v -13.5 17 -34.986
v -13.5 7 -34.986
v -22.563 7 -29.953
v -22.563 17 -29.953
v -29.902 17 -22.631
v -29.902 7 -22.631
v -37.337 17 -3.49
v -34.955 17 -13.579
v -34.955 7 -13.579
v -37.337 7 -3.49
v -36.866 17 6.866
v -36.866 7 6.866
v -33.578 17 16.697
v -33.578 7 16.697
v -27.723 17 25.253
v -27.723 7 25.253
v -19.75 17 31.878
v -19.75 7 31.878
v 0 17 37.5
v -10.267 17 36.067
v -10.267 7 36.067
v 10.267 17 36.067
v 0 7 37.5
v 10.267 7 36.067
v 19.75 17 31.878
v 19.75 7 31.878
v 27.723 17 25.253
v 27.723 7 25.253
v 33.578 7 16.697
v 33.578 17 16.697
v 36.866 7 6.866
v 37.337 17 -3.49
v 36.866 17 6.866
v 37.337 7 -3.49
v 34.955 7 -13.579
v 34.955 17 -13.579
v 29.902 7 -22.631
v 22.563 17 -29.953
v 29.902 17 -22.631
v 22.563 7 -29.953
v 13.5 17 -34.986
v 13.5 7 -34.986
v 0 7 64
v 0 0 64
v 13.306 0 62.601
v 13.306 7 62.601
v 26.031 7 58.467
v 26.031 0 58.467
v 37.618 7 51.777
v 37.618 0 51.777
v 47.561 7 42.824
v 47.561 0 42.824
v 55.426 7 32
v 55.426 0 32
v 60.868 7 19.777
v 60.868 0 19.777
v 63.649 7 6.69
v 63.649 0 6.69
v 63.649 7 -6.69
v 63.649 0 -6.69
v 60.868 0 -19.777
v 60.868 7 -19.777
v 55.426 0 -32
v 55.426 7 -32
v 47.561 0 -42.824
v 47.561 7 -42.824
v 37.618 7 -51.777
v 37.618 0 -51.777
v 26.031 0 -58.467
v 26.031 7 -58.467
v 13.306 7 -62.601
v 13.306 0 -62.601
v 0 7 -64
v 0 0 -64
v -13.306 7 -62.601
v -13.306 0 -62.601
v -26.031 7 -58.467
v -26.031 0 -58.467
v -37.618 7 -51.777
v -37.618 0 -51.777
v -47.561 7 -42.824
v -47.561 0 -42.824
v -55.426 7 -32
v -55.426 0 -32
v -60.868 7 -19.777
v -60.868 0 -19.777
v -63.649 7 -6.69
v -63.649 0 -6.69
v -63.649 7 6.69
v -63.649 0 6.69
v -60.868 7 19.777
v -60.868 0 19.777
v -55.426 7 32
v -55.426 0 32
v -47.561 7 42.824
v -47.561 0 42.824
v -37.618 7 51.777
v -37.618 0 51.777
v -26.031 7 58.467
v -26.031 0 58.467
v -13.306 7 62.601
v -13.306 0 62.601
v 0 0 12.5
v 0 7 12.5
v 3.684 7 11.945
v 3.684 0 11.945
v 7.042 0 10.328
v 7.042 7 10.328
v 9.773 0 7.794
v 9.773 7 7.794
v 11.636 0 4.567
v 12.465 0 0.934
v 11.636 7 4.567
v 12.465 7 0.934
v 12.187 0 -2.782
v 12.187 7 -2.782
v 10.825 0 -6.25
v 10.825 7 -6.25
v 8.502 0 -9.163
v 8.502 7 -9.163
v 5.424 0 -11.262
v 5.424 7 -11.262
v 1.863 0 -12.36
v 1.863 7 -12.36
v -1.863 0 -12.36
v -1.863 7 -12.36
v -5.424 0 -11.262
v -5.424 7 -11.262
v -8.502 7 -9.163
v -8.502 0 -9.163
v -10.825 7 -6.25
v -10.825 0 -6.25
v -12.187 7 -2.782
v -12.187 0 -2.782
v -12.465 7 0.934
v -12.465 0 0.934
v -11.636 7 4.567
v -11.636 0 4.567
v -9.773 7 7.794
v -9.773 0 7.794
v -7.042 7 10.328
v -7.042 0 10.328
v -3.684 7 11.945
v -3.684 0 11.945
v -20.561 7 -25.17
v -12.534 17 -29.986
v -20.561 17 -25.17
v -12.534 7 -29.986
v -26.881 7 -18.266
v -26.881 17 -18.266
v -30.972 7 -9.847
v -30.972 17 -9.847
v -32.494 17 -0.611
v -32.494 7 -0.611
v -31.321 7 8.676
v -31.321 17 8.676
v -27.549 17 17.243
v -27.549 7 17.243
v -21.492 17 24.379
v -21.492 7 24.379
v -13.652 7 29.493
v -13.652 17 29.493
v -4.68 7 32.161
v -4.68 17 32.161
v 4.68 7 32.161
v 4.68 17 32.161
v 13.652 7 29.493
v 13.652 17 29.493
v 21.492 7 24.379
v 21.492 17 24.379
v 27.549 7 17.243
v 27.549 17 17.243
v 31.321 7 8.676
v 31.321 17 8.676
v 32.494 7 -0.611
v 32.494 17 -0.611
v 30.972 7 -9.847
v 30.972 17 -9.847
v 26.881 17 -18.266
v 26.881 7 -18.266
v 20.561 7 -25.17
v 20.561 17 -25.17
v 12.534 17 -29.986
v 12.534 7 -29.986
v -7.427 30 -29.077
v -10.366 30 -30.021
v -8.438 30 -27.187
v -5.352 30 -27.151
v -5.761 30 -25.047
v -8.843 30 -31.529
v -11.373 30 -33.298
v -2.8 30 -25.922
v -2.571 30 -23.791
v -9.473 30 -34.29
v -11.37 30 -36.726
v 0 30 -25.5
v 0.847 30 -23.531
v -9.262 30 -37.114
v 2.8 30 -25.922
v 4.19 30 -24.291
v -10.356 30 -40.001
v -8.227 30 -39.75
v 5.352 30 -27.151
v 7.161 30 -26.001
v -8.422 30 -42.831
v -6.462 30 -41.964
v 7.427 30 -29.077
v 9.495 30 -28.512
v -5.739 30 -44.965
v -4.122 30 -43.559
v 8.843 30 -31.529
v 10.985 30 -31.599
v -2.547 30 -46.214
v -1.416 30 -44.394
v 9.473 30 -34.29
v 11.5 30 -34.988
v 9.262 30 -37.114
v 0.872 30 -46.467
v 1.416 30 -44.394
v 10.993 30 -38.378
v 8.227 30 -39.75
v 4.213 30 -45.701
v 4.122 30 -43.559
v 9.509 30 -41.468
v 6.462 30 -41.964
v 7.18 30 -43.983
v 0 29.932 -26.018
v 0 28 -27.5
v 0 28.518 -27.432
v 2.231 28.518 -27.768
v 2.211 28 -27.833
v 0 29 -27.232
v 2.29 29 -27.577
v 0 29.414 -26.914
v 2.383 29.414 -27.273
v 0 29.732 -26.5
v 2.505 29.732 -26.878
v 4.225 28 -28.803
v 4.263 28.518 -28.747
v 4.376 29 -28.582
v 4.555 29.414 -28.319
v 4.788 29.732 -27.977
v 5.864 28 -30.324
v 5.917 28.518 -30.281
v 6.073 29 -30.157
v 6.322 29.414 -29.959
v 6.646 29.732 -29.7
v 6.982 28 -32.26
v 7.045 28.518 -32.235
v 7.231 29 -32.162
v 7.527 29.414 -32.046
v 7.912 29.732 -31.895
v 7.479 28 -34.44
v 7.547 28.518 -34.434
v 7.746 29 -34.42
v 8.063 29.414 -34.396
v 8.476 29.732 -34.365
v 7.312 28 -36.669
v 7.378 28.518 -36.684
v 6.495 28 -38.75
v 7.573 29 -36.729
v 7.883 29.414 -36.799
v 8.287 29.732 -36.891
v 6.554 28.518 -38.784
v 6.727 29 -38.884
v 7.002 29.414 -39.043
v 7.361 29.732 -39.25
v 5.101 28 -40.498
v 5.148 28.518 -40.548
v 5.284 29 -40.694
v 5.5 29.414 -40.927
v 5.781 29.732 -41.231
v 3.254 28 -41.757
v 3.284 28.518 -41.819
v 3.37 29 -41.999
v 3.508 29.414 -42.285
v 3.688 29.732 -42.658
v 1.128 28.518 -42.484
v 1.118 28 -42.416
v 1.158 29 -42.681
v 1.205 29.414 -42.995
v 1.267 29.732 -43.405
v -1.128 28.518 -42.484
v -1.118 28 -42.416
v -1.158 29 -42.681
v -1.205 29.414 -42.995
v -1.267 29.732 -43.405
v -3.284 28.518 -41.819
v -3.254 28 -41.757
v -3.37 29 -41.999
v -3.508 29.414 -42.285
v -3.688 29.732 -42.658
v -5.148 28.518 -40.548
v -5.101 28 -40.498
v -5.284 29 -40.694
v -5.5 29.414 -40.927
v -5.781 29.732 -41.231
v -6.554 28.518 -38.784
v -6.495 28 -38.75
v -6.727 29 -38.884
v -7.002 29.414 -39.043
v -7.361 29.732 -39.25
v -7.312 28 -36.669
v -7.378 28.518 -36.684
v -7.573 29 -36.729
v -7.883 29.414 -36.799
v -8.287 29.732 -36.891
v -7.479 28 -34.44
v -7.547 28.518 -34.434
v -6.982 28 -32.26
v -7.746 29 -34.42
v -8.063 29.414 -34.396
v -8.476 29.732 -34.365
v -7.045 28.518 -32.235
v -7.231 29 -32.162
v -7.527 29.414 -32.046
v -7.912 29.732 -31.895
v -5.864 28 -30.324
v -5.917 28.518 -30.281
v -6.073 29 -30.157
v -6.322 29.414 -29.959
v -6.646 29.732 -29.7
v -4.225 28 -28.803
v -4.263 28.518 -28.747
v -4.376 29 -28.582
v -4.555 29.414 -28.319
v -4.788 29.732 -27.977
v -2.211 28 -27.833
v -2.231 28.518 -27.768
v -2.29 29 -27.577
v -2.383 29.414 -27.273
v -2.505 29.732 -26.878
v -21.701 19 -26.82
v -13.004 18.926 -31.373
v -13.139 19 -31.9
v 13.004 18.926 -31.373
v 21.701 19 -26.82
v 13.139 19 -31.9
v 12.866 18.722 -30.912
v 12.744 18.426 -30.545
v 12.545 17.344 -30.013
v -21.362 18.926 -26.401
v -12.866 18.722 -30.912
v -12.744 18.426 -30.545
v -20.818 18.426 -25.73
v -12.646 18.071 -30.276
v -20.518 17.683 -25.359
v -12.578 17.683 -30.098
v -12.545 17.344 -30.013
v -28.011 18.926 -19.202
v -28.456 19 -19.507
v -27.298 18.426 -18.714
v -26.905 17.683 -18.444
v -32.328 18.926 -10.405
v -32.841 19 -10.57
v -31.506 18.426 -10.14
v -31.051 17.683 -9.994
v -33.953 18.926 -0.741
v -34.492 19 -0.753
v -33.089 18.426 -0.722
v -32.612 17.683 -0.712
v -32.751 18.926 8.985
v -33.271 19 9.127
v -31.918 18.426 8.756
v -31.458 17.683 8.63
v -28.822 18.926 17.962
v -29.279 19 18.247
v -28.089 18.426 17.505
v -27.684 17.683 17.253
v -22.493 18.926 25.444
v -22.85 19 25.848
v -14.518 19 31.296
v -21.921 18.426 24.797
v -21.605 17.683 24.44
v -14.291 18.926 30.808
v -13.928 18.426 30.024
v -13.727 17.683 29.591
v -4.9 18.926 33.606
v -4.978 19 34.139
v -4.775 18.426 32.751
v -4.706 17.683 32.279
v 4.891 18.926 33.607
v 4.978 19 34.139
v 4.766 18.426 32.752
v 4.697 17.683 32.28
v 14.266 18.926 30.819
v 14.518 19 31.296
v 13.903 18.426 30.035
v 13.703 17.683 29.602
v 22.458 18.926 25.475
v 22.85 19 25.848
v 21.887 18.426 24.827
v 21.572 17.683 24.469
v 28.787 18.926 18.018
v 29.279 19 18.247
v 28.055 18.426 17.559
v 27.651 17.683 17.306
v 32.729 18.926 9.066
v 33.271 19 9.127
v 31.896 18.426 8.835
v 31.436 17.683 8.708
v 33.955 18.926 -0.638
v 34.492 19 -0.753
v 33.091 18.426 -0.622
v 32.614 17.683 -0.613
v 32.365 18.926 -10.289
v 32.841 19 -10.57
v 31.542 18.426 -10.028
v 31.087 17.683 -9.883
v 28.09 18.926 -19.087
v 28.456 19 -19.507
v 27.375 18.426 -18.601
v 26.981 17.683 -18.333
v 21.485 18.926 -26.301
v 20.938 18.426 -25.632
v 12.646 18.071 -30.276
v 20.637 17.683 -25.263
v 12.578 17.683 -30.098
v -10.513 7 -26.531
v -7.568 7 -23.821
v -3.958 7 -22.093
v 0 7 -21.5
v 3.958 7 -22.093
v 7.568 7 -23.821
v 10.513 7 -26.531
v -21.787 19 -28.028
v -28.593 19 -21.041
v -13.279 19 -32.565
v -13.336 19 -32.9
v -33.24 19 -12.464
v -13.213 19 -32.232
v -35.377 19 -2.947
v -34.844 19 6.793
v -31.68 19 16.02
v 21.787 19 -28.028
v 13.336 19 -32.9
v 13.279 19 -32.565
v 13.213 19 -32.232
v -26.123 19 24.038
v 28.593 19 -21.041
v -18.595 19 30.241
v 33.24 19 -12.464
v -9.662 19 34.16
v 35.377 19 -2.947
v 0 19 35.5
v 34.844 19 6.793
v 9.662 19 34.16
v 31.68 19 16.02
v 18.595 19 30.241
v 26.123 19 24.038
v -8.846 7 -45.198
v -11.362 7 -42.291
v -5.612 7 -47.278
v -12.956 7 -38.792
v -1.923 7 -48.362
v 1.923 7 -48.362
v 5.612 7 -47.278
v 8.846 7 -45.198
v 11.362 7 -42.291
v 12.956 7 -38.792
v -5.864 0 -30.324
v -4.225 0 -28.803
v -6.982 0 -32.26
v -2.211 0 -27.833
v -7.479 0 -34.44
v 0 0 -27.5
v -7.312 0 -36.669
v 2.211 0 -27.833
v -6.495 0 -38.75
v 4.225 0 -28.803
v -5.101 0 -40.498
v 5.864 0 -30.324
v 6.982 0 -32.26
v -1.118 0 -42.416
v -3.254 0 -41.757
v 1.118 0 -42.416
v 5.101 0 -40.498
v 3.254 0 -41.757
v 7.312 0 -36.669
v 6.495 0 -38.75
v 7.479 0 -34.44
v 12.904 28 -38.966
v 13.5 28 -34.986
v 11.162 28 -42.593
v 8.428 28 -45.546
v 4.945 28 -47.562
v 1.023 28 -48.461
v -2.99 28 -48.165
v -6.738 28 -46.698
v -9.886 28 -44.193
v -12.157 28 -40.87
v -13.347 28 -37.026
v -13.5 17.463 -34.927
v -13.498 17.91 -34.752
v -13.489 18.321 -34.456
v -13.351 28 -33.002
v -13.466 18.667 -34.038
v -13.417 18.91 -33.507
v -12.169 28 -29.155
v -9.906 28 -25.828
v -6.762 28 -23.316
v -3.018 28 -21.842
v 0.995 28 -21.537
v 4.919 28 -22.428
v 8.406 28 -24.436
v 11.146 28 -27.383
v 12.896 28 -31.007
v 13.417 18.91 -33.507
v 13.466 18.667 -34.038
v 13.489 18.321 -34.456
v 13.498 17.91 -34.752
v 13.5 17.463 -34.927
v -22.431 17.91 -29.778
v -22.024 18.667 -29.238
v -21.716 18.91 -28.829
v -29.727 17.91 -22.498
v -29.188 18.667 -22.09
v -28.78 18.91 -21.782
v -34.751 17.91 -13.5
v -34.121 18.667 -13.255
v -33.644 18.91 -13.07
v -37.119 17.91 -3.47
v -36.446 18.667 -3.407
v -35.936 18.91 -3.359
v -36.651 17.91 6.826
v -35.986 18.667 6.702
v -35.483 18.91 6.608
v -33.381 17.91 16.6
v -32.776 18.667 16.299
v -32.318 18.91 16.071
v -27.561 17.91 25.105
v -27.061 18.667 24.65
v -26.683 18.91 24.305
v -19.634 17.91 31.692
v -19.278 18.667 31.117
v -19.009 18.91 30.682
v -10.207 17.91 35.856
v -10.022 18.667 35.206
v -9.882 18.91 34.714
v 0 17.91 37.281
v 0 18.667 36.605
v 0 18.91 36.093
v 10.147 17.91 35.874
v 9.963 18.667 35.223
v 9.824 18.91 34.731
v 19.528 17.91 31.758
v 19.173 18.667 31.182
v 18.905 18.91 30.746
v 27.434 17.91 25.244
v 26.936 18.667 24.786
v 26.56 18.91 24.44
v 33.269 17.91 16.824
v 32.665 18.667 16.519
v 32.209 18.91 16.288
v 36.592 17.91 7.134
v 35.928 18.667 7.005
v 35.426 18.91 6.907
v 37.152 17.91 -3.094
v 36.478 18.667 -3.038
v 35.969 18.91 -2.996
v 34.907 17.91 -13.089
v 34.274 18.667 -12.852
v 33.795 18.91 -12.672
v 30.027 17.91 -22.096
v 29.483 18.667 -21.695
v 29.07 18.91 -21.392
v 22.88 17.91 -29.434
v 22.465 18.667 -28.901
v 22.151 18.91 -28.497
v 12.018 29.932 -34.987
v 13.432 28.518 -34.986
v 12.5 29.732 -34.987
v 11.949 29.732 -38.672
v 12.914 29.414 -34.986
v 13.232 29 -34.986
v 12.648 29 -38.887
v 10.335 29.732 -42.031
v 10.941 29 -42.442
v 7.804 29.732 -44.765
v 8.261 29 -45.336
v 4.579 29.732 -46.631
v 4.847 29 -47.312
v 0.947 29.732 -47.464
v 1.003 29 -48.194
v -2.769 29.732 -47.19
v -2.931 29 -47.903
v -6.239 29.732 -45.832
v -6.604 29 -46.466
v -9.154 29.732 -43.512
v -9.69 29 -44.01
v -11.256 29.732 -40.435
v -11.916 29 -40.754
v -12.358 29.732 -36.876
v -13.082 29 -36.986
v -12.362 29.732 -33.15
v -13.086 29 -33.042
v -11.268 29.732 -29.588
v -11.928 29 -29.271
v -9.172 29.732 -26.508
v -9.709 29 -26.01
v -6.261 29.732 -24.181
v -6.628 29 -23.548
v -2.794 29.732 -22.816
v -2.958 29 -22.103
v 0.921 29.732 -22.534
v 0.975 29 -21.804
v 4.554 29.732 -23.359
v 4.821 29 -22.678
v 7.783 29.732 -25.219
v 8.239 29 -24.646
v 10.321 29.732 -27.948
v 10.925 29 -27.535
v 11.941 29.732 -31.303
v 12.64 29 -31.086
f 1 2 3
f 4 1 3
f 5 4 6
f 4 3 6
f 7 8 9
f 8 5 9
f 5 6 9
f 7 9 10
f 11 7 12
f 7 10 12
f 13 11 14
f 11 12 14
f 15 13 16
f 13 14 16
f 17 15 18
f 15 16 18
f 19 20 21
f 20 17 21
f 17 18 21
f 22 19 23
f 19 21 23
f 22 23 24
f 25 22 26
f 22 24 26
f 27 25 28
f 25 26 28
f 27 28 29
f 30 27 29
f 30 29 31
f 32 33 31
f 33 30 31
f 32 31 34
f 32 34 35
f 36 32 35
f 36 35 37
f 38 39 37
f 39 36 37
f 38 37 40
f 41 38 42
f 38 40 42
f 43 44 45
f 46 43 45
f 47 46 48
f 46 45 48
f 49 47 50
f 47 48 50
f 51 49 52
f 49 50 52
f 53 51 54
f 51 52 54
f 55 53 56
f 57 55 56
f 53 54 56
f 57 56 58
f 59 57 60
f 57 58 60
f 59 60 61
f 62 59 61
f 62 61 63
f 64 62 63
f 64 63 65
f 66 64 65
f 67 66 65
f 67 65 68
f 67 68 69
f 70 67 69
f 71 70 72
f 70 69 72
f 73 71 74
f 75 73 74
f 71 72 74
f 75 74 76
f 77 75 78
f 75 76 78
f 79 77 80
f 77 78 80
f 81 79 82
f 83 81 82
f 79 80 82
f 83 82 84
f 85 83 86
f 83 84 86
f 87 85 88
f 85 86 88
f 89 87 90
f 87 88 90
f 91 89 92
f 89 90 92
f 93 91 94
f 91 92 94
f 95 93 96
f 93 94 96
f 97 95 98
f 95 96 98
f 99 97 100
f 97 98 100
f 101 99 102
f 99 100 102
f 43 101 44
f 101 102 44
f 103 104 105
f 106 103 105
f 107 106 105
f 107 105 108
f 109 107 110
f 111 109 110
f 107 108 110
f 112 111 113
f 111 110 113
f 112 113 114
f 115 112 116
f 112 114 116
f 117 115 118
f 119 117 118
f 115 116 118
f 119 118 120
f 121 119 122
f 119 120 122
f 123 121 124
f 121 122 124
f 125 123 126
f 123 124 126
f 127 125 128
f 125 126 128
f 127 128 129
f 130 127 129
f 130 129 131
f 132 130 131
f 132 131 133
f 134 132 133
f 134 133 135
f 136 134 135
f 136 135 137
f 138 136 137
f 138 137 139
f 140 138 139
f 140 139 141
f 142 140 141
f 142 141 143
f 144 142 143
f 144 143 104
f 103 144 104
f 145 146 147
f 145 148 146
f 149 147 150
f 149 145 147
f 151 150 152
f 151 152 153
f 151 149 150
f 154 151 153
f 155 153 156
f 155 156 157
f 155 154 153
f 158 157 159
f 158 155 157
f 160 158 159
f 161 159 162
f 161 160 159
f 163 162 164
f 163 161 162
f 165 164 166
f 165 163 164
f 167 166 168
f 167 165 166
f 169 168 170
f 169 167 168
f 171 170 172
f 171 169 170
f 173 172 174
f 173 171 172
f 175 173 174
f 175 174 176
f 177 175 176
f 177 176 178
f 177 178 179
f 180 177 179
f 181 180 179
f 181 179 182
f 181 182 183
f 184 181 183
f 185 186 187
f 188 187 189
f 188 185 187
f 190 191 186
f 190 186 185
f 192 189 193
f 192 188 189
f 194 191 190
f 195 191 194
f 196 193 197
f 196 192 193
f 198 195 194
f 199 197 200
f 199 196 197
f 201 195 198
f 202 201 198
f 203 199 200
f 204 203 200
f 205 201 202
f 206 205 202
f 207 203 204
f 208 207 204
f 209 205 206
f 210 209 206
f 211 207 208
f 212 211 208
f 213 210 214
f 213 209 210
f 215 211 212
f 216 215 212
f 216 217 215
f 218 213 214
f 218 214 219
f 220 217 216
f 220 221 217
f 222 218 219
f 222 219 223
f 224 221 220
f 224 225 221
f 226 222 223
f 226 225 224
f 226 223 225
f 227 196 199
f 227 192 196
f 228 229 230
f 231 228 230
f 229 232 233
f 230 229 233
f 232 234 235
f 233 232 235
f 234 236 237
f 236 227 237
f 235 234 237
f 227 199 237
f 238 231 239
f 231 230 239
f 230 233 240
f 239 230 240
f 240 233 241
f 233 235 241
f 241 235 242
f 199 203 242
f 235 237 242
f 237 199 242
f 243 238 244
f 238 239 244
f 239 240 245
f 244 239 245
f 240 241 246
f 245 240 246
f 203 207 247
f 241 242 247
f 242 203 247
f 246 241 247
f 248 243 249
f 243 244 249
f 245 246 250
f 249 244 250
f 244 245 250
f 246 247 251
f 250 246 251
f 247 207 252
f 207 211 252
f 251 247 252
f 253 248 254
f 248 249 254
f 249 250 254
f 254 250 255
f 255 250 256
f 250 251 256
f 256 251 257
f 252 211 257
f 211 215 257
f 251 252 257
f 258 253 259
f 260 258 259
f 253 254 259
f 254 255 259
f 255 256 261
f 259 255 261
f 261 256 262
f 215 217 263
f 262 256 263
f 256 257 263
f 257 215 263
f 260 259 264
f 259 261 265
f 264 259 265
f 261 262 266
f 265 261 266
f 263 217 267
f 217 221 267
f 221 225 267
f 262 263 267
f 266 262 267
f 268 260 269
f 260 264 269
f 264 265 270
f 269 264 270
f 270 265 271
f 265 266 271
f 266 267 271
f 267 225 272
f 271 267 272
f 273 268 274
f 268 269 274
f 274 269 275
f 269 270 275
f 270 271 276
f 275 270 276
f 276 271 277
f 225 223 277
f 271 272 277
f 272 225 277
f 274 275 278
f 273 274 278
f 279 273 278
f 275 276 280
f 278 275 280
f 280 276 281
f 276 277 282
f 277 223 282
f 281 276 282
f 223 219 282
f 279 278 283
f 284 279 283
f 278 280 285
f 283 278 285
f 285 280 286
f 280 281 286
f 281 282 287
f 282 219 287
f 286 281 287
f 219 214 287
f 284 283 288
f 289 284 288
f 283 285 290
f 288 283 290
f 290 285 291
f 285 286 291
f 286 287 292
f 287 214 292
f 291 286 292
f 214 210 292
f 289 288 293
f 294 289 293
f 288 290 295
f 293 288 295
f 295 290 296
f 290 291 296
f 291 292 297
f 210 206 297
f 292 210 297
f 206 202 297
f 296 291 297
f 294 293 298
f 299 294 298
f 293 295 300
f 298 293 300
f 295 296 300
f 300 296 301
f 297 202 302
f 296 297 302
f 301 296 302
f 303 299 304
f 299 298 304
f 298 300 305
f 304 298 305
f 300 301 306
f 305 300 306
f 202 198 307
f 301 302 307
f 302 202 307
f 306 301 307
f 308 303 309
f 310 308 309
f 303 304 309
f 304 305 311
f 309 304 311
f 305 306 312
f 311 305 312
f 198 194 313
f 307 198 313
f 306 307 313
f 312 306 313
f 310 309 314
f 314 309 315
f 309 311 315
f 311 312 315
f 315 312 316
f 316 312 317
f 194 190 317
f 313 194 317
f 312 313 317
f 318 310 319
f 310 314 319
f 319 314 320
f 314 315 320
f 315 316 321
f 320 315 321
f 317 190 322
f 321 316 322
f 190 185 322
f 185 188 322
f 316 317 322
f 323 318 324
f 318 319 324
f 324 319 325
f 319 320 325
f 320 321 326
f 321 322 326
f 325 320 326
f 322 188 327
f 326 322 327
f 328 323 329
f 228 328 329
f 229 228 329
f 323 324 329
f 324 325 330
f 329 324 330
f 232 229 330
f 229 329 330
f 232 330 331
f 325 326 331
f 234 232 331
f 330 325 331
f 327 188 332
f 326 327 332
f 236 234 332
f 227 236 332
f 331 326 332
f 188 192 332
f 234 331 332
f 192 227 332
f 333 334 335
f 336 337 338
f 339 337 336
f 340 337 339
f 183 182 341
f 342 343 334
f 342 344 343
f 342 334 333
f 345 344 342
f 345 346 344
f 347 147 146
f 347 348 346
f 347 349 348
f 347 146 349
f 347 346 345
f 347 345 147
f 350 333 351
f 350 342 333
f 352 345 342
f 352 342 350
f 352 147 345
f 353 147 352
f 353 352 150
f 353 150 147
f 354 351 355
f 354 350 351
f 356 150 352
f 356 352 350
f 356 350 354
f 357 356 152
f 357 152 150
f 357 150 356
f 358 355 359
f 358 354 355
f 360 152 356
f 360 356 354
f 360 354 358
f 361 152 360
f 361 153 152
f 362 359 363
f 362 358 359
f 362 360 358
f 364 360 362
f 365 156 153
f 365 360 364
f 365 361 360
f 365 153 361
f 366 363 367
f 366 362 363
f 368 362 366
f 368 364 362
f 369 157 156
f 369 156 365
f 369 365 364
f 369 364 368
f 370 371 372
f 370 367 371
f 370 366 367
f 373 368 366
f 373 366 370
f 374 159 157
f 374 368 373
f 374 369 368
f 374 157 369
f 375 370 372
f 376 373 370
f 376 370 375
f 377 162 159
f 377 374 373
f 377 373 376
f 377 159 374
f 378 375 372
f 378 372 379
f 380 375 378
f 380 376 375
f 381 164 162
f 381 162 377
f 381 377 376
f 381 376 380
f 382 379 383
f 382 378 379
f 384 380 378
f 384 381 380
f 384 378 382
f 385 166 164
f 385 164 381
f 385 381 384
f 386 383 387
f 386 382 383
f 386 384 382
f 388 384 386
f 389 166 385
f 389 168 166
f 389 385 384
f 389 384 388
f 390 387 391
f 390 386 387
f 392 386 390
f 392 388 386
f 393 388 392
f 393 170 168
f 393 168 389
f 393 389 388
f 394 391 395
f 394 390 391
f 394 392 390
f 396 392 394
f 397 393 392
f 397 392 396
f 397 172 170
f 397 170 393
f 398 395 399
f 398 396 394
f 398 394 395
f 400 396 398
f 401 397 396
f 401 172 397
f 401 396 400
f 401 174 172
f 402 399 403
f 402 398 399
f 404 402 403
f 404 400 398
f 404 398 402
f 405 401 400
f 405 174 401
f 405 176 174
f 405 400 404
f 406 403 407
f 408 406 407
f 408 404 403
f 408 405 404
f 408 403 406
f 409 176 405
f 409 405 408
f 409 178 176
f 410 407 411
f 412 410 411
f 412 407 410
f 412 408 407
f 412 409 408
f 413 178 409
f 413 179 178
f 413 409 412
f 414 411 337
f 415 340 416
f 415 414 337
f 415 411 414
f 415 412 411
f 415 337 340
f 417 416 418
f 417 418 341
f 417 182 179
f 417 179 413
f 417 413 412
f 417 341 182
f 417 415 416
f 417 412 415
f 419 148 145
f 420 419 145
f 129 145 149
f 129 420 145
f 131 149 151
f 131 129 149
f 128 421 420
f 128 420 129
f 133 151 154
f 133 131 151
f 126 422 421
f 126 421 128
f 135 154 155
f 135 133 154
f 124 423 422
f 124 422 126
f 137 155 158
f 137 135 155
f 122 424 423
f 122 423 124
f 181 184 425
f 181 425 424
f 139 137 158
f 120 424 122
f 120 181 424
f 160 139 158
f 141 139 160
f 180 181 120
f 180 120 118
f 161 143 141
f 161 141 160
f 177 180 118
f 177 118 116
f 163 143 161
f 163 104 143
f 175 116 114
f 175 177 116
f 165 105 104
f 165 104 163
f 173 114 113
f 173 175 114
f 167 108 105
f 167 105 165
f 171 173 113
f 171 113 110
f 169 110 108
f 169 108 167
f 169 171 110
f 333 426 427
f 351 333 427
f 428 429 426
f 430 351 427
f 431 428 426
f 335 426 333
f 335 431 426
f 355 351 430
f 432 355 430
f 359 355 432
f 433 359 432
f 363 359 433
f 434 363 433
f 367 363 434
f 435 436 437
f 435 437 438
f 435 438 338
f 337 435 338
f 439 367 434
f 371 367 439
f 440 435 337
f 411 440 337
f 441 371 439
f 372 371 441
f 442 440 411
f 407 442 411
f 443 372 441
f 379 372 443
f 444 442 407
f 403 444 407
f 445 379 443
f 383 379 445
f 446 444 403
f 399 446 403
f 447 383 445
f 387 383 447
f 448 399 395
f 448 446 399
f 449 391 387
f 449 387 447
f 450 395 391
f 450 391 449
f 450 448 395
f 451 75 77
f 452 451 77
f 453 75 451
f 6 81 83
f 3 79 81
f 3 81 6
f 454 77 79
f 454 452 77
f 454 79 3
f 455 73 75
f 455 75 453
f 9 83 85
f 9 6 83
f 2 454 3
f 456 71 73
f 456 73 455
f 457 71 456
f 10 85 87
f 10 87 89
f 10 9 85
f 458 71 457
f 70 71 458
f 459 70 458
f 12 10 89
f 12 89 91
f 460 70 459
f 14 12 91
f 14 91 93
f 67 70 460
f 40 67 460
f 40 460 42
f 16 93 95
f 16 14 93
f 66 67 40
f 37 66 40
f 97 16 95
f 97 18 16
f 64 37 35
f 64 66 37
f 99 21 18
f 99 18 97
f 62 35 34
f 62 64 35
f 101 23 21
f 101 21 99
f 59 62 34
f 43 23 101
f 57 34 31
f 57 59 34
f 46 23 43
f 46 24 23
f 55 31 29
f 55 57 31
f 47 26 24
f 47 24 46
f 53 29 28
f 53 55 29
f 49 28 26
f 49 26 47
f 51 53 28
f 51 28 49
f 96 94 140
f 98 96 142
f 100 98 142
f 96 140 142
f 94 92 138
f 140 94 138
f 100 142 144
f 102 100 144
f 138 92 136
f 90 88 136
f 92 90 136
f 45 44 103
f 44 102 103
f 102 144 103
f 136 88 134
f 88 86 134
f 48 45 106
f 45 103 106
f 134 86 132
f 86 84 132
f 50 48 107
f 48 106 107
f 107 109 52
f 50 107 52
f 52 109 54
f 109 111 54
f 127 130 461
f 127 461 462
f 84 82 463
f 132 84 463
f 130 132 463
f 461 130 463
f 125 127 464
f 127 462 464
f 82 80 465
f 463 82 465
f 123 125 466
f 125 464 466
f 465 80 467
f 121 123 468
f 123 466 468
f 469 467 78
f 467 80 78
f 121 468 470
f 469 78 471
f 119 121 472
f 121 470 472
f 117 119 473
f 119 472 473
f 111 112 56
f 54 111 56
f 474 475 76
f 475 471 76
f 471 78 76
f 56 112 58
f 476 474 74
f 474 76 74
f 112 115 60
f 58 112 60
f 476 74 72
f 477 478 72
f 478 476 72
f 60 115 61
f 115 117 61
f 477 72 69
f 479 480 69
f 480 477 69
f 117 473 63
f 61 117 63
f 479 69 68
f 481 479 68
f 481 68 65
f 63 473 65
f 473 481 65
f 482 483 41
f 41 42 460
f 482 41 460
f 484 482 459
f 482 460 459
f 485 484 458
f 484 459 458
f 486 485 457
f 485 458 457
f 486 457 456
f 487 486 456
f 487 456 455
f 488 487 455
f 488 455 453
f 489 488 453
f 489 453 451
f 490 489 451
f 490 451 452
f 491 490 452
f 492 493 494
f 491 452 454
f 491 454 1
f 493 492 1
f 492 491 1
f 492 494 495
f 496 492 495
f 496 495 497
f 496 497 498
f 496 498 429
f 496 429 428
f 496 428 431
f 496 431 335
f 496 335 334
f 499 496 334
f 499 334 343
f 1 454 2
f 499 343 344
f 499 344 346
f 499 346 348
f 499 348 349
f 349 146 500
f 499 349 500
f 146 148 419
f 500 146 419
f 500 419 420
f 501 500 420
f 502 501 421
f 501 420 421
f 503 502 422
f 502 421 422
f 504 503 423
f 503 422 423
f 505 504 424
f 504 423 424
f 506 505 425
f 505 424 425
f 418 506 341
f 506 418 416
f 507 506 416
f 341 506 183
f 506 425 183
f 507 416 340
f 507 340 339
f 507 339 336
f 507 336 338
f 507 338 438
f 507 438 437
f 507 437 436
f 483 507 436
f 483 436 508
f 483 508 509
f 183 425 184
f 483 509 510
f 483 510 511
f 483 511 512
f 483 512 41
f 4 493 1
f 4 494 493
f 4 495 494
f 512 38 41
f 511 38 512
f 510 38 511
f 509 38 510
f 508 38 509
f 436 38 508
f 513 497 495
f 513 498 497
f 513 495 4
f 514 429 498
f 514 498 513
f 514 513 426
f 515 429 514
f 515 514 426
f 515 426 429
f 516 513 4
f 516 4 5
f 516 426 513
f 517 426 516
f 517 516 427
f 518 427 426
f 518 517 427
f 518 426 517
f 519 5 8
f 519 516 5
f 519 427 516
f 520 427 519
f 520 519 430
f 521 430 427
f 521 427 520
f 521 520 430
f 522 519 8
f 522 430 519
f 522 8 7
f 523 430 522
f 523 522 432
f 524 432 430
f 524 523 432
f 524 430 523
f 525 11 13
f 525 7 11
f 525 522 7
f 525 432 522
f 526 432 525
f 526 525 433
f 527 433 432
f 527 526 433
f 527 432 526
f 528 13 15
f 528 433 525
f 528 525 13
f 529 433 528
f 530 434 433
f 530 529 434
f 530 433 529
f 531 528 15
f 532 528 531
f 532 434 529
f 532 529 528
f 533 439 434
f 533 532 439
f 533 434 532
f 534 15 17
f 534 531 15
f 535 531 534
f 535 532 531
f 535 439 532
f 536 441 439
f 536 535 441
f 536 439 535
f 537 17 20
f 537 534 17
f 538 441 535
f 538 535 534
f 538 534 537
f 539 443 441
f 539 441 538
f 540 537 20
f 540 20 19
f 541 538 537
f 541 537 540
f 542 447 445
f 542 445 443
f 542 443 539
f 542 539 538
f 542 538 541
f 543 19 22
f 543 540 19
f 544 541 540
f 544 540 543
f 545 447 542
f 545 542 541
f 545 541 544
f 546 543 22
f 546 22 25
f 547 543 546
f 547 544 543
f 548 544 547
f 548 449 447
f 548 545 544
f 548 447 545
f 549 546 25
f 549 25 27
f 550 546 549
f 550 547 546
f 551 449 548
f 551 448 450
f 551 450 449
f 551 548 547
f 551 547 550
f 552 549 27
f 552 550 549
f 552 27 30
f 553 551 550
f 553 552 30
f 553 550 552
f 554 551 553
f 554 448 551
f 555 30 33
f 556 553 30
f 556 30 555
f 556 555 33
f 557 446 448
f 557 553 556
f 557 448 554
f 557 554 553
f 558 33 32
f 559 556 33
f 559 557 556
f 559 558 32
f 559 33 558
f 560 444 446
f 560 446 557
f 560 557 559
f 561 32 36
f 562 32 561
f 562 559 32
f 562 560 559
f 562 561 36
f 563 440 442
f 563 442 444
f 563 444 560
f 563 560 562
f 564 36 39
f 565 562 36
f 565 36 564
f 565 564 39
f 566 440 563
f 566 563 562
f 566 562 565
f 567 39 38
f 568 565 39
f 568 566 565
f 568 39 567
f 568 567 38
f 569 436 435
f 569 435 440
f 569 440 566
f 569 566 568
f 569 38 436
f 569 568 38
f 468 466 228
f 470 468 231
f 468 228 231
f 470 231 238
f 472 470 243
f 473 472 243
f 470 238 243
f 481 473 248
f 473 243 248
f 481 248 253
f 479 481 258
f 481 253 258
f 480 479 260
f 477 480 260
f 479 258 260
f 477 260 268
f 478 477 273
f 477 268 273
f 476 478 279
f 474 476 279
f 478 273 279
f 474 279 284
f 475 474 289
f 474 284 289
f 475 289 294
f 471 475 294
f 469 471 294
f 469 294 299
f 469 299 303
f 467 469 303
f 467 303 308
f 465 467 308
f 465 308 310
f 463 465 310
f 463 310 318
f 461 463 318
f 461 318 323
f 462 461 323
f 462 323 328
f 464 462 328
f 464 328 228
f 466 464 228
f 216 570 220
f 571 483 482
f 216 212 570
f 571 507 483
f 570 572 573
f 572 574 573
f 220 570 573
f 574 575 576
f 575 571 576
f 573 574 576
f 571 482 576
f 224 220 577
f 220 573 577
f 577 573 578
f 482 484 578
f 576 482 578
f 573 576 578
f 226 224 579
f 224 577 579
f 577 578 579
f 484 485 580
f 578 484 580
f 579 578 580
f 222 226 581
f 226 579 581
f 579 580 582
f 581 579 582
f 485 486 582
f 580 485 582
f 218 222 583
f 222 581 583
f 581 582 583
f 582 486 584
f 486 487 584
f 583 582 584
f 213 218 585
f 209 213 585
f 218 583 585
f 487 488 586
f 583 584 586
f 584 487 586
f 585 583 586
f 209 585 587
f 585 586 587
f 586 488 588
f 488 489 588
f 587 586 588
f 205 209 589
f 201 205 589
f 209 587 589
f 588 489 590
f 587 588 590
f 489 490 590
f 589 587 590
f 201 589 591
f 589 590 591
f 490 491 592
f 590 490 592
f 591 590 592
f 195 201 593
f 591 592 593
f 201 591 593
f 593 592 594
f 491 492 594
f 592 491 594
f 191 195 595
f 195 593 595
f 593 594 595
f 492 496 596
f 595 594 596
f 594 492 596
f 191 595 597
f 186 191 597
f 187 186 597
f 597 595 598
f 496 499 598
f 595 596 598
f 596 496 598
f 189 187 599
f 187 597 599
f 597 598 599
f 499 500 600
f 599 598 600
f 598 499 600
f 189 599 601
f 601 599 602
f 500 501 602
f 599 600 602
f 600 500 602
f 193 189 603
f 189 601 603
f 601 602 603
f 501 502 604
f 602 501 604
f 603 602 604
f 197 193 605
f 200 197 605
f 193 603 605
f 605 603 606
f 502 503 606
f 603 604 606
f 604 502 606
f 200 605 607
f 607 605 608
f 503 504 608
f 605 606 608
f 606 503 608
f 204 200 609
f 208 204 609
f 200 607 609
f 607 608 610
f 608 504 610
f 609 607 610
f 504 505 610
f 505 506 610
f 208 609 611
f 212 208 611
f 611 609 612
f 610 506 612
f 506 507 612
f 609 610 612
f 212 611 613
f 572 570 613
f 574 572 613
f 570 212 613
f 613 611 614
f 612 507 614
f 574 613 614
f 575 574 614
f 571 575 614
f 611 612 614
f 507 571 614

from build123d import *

# Parameters (mm, degrees)
SKETCH_4_R          = 64
EXTRUDE_1_DEPTH     = 7
SKETCH_5_R          = 37.5
SKETCH_5_R_2        = 32.5
EXTRUDE_2_DEPTH     = 12
SKETCH_7_R          = 12.5
CUT_EXTRUDE_1_DEPTH = 92.301697684
FILLET_1_R          = 2
SKETCH_10_R         = 13.5
EXTRUDE_3_DEPTH     = 30
SKETCH_11_R         = 7.5
CUT_EXTRUDE_2_DEPTH = 96.351979528
FILLET_2_R          = 2


with BuildPart() as part:
    # 草图4 → 凸台-拉伸1 (new body)
    with BuildSketch(Plane(origin=(0, 0, 0), x_dir=(1, 0, 0), z_dir=(0, 1, 0))):
        with Locations(Location((0, 0, 0), (0, 0, 270))):
            Circle(SKETCH_4_R)
    extrude(amount=EXTRUDE_1_DEPTH)

    # 草图5 → 凸台-拉伸2 (add)
    with BuildSketch(Plane(origin=(0, 7, 0), x_dir=(1, 0, 0), z_dir=(0, 1, 0))):
        with Locations(Location((0, 0, 0), (0, 0, 270))):
            Circle(SKETCH_5_R)
        with Locations(Location((0, 0, 0), (0, 0, 270))):
            Circle(SKETCH_5_R_2, mode=Mode.SUBTRACT)
    extrude(amount=EXTRUDE_2_DEPTH)

    # 草图7 → 切除-拉伸1 (cut, through all)
    with BuildSketch(Plane(origin=(0, 7, 0), x_dir=(1, 0, 0), z_dir=(0, 1, 0))):
        with Locations(Location((0, 0, 0), (0, 0, 270))):
            Circle(SKETCH_7_R)
    extrude(amount=-CUT_EXTRUDE_1_DEPTH, mode=Mode.SUBTRACT)

    # 圆角1
    fillet_1_edges = [part.edges().sort_by_distance(p)[0] for p in [
        (0, 19, -32.5),
        (0, 19, -37.5),
    ]]
    fillet(fillet_1_edges, radius=FILLET_1_R)

    # 草图10 → 凸台-拉伸3 (add)
    with BuildSketch(Plane(origin=(0, 0, 0), x_dir=(1, 0, 0), z_dir=(0, 1, 0))):
        with Locations(Location((0, 35, 0), (0, 0, 359.939369671))):
            Circle(SKETCH_10_R)
    extrude(amount=EXTRUDE_3_DEPTH)

    # 草图11 → 切除-拉伸2 (cut, through all)
    with BuildSketch(Plane(origin=(0, 30, 0), x_dir=(1, 0, 0), z_dir=(0, 1, 0))):
        with Locations(Location((0, 35, 0), (0, 0, 270))):
            Circle(SKETCH_11_R)
    extrude(amount=-CUT_EXTRUDE_2_DEPTH, mode=Mode.SUBTRACT)

    # 圆角2
    fillet_2_edges = [part.edges().sort_by_distance(p)[0] for p in [
        (-13.499992441, 30, -35.014285682),
        (0, 30, -42.5),
    ]]
    fillet(fillet_2_edges, radius=FILLET_2_R)


solid = part.part
